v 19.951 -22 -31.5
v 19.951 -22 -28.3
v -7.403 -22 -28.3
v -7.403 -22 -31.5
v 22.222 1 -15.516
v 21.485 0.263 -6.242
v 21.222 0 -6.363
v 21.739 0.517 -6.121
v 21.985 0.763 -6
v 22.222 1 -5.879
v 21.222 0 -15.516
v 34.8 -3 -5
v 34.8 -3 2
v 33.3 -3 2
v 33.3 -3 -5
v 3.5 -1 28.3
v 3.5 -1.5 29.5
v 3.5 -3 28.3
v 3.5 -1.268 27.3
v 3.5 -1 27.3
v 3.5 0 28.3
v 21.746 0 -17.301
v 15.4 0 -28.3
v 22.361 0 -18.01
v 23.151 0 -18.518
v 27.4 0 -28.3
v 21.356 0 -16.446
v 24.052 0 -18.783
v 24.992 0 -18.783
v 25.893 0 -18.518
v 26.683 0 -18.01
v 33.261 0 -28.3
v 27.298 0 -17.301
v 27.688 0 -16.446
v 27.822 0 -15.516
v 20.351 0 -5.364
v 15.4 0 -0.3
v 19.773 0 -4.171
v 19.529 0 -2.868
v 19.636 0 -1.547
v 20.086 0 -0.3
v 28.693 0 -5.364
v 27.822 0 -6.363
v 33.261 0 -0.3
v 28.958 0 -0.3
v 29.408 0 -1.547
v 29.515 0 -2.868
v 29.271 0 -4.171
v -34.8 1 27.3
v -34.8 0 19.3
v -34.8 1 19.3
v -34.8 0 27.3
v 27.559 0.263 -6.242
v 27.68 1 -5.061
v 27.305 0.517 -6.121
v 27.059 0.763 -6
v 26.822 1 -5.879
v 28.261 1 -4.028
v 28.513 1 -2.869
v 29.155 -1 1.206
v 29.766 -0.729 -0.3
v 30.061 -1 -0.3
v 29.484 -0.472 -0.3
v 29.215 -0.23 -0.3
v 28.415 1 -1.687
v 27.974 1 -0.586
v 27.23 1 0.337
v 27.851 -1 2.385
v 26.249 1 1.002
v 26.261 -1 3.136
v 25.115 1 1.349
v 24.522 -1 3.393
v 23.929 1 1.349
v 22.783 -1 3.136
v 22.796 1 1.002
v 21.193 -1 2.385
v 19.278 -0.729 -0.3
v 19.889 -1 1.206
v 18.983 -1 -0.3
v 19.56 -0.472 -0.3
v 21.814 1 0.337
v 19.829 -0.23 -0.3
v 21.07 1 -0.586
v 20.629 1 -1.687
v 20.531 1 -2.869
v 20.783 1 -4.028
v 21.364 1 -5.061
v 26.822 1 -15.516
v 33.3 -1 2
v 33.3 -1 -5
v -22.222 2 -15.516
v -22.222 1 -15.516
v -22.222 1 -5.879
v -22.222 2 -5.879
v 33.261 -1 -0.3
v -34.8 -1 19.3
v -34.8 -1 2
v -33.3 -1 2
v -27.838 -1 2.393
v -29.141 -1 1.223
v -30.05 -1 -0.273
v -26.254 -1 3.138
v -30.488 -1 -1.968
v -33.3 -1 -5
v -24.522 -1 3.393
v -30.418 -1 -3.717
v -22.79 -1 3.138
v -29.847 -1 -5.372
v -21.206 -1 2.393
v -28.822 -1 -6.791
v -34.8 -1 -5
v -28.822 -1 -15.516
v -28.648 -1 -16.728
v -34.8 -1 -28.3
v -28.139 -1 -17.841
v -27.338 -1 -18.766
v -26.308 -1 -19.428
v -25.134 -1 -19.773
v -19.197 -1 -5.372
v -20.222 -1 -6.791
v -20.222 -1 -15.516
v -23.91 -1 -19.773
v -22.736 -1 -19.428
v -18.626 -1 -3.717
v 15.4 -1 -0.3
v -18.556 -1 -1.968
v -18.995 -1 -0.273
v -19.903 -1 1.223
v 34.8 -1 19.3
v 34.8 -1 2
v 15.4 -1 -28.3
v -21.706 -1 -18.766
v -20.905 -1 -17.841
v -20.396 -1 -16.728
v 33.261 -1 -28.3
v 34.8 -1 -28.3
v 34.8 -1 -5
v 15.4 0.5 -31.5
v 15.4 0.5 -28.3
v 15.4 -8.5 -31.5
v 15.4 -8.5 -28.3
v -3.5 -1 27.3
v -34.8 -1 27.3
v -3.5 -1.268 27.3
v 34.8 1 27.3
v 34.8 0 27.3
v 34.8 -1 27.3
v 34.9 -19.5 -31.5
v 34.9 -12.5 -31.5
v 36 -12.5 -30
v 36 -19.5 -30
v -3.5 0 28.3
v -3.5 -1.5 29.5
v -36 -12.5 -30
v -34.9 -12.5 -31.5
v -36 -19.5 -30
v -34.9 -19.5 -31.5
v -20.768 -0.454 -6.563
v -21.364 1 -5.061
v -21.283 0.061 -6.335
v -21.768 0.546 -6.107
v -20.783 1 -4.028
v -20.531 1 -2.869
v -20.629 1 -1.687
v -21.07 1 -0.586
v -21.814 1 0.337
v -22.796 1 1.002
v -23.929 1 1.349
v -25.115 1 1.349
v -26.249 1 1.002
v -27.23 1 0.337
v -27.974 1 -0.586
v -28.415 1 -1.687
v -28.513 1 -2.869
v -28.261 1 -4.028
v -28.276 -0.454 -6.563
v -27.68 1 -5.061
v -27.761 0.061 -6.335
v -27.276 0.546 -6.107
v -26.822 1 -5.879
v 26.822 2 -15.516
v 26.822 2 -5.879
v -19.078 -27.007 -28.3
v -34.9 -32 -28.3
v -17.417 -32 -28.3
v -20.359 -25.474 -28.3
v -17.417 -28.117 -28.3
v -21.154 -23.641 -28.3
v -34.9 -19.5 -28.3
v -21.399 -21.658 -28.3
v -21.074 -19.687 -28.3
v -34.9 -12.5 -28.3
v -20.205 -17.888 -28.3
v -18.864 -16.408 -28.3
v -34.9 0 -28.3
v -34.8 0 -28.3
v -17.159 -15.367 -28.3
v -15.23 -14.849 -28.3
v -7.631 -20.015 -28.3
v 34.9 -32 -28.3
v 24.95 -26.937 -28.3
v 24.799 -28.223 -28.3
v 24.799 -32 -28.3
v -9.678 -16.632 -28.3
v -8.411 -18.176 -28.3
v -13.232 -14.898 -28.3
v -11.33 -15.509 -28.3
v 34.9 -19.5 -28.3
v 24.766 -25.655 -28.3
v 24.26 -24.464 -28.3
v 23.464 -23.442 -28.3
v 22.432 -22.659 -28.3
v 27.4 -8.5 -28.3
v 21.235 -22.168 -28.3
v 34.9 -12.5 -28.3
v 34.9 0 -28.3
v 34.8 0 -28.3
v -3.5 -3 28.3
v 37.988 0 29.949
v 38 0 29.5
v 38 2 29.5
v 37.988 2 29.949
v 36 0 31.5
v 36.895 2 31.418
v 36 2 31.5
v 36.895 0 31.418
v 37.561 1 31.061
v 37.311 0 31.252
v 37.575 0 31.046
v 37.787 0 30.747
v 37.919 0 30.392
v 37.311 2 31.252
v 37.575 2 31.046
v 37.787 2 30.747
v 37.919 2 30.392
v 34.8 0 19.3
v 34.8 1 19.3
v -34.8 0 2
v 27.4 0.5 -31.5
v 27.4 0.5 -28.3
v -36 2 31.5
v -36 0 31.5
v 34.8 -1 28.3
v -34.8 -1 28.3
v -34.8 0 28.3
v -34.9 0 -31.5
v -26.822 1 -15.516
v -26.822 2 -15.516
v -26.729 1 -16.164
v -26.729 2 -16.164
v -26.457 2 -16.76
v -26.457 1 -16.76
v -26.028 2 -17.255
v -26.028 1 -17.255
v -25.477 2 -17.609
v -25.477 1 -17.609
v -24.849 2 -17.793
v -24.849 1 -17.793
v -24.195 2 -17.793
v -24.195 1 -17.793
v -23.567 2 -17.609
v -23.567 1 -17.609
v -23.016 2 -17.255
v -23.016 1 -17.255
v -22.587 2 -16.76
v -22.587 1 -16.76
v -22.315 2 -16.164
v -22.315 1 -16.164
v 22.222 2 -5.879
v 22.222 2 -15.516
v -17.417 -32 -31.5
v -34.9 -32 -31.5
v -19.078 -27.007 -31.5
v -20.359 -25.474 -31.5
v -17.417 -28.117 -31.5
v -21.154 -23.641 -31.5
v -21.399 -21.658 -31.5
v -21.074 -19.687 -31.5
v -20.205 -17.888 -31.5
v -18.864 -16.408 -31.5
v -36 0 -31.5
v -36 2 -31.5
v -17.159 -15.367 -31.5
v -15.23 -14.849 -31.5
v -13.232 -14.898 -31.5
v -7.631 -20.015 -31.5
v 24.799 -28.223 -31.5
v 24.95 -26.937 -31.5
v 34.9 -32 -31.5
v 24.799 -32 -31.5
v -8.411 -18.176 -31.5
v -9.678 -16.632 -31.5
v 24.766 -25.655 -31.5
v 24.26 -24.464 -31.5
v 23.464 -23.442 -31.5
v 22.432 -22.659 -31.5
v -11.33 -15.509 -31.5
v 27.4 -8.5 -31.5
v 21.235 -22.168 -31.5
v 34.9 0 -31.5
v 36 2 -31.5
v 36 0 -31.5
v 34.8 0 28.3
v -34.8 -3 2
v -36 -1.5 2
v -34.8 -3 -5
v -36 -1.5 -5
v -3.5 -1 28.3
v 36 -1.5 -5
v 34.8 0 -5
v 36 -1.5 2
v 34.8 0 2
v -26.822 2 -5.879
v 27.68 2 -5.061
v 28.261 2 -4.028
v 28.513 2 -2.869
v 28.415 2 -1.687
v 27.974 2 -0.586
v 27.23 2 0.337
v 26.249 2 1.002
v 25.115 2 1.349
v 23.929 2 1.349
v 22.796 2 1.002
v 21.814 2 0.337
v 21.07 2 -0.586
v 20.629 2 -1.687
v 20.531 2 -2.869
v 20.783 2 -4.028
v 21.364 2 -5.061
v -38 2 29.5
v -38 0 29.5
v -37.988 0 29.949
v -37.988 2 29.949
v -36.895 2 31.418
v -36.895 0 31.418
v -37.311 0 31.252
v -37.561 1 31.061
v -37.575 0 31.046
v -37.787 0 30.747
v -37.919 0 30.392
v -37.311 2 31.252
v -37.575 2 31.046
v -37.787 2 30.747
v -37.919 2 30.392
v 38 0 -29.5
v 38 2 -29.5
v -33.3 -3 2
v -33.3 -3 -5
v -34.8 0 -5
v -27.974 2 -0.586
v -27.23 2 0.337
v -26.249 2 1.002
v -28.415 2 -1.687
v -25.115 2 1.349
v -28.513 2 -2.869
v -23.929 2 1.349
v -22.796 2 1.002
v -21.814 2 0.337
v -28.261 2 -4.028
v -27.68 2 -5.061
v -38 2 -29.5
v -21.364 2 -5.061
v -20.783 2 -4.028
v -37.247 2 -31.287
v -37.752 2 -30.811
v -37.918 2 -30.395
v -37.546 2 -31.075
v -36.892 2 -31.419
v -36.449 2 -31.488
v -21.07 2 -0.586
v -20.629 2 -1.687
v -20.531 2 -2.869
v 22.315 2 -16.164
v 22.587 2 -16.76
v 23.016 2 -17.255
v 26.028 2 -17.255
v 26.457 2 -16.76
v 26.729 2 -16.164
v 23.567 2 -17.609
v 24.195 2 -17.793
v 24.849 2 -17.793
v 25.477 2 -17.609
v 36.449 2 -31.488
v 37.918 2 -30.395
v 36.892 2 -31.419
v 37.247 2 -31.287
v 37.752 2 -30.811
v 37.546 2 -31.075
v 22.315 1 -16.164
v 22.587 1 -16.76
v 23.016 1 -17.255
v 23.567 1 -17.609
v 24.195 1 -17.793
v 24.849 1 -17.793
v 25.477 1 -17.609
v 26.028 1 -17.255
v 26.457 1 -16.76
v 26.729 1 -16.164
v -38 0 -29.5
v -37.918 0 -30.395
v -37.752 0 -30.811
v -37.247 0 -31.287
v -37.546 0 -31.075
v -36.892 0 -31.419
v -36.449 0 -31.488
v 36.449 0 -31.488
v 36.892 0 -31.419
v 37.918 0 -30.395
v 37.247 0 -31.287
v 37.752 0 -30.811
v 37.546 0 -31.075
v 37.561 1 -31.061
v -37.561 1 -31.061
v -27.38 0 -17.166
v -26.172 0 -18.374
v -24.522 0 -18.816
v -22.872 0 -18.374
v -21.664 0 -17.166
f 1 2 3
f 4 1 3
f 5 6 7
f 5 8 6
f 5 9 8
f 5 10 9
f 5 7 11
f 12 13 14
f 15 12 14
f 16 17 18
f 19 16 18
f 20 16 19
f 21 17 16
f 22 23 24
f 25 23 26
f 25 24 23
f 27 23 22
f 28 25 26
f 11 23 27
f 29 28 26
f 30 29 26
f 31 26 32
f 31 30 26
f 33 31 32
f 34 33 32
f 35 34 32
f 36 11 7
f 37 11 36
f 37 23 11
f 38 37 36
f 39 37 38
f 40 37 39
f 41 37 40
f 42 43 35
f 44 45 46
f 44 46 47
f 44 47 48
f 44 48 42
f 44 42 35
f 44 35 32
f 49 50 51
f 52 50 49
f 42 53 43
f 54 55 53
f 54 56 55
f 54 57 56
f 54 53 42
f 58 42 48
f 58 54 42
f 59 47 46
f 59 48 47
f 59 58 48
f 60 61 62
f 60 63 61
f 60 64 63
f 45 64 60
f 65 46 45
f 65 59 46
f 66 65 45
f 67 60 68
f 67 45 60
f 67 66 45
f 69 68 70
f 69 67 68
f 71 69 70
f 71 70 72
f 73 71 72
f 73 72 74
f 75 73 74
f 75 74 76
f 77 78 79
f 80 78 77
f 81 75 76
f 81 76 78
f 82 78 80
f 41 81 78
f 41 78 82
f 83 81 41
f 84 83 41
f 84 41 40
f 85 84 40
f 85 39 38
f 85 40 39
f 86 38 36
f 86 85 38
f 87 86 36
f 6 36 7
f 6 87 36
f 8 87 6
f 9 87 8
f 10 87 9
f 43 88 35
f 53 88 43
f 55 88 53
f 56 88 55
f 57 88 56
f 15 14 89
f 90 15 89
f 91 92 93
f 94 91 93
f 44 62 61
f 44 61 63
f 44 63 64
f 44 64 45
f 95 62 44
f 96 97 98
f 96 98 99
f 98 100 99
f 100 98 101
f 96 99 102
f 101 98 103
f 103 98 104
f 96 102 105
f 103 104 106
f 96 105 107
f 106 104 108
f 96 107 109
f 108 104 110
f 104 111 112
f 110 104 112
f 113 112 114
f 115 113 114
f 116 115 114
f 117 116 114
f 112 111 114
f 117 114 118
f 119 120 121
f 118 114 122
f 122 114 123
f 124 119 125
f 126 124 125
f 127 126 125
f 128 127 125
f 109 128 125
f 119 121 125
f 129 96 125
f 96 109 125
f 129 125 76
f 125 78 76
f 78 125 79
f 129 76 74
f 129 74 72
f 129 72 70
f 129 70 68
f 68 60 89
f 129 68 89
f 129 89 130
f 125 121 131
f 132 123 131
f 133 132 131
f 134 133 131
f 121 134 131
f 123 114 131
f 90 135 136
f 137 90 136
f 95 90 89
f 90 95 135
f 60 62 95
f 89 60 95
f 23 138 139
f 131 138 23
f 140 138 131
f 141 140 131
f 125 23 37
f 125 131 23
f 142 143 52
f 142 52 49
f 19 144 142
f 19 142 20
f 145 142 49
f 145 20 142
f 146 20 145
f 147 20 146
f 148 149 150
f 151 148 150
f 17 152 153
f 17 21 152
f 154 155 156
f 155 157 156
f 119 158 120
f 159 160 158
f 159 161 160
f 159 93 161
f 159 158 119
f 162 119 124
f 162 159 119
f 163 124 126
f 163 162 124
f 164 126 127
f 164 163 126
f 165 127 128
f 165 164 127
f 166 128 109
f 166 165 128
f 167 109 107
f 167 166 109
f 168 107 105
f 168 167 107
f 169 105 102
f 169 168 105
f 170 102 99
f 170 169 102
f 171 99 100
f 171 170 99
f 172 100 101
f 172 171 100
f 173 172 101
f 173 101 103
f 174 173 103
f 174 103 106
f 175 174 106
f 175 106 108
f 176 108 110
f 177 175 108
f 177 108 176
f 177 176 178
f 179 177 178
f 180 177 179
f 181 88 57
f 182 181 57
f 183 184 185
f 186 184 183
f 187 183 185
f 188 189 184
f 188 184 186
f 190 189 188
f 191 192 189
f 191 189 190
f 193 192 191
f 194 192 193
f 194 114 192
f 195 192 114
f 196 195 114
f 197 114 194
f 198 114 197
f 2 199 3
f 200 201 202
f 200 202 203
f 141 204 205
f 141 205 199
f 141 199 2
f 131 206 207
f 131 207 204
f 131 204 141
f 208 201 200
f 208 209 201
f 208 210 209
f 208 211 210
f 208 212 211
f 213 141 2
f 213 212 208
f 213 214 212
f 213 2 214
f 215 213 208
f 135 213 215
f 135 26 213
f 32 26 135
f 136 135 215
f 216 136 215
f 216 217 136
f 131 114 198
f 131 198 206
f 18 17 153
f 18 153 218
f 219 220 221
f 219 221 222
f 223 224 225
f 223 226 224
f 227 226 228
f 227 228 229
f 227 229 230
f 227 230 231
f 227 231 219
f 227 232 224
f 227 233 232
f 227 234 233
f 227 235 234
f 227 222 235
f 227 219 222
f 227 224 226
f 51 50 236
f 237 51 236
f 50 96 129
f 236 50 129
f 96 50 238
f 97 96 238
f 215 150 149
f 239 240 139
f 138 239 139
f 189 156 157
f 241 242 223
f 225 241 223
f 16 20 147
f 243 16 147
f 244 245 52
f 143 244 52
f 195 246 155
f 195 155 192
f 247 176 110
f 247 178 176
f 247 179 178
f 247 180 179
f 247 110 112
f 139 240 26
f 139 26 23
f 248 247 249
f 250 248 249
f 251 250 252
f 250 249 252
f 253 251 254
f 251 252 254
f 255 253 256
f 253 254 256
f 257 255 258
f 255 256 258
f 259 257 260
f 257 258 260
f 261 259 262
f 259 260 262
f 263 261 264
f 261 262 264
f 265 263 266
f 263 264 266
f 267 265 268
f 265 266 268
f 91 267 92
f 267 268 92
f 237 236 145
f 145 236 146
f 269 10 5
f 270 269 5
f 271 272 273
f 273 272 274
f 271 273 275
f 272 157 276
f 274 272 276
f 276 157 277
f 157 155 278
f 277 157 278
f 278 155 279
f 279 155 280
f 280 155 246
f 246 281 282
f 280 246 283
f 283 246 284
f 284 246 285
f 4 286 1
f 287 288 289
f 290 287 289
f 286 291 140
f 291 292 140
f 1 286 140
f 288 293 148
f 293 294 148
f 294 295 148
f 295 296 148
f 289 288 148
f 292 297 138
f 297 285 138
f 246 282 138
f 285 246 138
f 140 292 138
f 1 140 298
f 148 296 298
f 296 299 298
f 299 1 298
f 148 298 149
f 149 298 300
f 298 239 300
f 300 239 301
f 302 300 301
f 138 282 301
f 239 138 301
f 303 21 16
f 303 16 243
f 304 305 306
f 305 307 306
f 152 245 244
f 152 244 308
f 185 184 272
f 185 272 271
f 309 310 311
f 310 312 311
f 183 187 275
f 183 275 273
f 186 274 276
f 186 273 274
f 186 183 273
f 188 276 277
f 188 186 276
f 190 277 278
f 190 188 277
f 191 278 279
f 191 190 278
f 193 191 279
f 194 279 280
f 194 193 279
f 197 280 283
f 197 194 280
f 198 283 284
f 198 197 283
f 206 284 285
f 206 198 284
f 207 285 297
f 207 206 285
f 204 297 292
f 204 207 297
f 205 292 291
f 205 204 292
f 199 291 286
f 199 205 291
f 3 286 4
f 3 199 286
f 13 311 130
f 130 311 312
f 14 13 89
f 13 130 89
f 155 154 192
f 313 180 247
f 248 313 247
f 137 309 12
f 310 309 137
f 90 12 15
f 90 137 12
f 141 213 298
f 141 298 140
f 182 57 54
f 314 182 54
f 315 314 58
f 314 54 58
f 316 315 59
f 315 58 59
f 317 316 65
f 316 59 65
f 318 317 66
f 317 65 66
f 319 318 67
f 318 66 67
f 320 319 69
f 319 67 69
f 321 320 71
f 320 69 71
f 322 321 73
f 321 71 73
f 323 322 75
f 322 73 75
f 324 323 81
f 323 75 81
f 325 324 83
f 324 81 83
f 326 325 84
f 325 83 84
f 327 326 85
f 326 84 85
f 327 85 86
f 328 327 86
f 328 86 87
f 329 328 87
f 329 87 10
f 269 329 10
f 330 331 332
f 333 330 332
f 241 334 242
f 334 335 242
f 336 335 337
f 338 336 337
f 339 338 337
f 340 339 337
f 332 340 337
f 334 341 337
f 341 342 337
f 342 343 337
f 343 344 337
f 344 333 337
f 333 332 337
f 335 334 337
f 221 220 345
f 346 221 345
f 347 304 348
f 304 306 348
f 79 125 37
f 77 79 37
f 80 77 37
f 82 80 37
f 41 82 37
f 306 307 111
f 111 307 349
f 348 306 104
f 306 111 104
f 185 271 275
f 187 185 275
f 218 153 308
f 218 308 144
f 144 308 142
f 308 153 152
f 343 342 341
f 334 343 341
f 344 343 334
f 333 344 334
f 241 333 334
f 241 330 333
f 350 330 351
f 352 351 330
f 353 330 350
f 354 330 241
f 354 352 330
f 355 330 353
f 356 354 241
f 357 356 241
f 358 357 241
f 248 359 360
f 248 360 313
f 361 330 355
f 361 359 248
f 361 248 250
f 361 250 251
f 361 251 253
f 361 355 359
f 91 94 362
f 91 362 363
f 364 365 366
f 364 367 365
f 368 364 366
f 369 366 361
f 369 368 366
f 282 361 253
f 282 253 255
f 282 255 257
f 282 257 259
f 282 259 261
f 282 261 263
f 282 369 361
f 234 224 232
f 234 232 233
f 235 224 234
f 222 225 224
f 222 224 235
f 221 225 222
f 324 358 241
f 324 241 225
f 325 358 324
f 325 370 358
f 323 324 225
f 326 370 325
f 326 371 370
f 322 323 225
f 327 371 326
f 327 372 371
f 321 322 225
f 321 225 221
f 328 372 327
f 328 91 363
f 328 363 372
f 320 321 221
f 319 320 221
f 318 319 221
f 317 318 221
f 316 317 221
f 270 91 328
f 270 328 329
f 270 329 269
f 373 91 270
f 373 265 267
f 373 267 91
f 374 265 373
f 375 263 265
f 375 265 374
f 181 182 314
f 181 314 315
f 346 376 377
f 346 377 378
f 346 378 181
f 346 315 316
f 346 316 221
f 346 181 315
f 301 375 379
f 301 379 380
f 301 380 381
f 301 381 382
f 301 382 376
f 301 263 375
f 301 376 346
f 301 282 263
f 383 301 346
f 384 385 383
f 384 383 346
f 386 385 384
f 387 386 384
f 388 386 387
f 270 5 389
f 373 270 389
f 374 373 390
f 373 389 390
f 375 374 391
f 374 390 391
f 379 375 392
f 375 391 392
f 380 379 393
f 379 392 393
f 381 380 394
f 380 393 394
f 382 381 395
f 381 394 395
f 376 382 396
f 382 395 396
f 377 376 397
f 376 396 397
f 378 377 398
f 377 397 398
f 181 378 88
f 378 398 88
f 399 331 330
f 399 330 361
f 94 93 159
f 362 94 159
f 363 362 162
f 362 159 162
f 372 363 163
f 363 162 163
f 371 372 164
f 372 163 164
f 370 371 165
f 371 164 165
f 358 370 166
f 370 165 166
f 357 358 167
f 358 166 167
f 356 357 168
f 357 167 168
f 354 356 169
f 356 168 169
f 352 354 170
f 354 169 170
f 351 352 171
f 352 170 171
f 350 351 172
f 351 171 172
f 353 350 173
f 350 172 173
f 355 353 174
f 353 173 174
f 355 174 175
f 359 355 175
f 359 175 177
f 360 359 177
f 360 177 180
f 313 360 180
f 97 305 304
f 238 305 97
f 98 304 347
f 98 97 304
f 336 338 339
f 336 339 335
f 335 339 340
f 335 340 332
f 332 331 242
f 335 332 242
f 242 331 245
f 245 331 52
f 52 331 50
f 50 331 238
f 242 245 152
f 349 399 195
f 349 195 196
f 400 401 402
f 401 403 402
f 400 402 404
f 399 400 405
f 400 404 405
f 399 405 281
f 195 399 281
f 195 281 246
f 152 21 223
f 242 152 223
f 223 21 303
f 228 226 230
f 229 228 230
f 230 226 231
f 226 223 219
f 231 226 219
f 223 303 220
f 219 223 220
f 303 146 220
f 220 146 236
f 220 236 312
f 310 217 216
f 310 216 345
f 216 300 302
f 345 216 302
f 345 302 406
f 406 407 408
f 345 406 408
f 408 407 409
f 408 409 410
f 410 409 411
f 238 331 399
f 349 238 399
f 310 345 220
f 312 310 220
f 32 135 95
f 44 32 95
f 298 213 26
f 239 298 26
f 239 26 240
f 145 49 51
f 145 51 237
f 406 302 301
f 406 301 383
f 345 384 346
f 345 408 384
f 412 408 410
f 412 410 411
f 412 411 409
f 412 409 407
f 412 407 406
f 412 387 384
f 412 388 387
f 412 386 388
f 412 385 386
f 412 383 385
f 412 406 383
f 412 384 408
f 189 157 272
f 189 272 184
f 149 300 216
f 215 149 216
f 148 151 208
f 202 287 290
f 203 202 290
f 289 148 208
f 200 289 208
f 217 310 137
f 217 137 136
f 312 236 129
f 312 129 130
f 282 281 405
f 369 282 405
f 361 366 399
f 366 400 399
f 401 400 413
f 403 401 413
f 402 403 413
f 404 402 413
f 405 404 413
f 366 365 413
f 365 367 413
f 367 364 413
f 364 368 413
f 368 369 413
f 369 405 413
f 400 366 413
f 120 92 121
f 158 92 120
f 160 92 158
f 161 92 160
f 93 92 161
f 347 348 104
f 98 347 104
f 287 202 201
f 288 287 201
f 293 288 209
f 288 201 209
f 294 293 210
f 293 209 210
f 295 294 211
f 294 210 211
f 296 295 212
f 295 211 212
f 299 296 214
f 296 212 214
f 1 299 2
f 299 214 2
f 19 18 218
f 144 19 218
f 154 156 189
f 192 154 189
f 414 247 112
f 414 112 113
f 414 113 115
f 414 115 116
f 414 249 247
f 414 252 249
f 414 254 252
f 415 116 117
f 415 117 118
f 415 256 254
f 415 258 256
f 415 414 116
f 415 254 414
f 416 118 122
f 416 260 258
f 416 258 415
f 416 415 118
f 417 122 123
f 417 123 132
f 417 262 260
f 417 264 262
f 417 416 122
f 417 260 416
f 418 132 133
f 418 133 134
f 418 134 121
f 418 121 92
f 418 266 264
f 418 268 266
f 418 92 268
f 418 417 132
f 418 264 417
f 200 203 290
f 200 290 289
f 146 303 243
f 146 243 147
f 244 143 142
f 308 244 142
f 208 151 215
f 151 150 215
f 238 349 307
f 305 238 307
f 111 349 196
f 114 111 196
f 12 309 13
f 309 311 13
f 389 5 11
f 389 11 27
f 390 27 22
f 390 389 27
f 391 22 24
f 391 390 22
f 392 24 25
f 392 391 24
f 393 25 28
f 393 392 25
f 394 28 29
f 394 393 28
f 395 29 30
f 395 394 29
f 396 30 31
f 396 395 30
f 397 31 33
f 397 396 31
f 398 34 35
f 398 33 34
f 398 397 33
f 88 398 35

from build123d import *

# Parameters (mm, degrees)
SKETCH1_W               = 76
SKETCH1_H               = 63
BOSS_EXTRUDE1_DEPTH     = 2
SKETCH2_W               = 69.6
SKETCH2_H               = 56.6
BOSS_EXTRUDE2_DEPTH     = 1
SKETCH3_W               = 69.8
SKETCH3_H               = 3.2
BOSS_EXTRUDE3_DEPTH     = 32
BOSS_EXTRUDE4_DEPTH     = 3.5
BOSS_EXTRUDE5_DEPTH     = 3.5
BOSS_EXTRUDE6_DEPTH     = 3.5
CUT_EXTRUDE1_DEPTH      = 7
CHAMFER1_SIZE           = 2
FILLET1_SIZE            = 2
CUT_EXTRUDE2_DEPTH      = 81.23091686
CUT_EXTRUDE2_DEPTH_BACK = 3.2
SKETCH8_R               = 7
SKETCH8_W               = 12
SKETCH8_H               = 9
SKETCH9_W               = 17.861030929
SKETCH9_H               = 28
CUT_EXTRUDE3_DEPTH      = 1
SKETCH10_W              = 69.6
SKETCH10_H              = 8
CUT_EXTRUDE4_DEPTH      = 2
CHAMFER2_SIZE2          = 1
CHAMFER2_SIZE           = 1.732050808
CUT_EXTRUDE5_DEPTH      = 3.2


# Some blends are built 0.0001 mm under size
with BuildPart() as part:
    # Sketch1 → Boss-Extrude1 (new body)
    with BuildSketch(Plane(origin=(0, 0, 0), x_dir=(1, 0, 0), z_dir=(0, 1, 0))):
        Rectangle(SKETCH1_W, SKETCH1_H)
    extrude(amount=BOSS_EXTRUDE1_DEPTH)

    # Sketch2 → Boss-Extrude2 (add)
    with BuildSketch(Plane(origin=(0, 0, 0), x_dir=(1, 0, 0), z_dir=(0, 1, 0))):
        Rectangle(SKETCH2_W, SKETCH2_H)
    extrude(amount=-BOSS_EXTRUDE2_DEPTH)

    # Sketch3 → Boss-Extrude3 (add)
    with BuildSketch(Plane.XZ):
        with Locations((0, -29.9)):
            Rectangle(SKETCH3_W, SKETCH3_H)
    extrude(amount=BOSS_EXTRUDE3_DEPTH)

    # Sketch4 → Boss-Extrude4 (add, symmetric)
    with BuildSketch(Plane.XY.offset(-1.5)):
        Polygon((-34.8, 0), (-36, -1.5), (-34.8, -3), (-33.3, -3), (-33.3, 0), align=None)
        Polygon((33.3, 0), (34.8, 0), (36, -1.5), (34.8, -3), (33.3, -3), align=None)
    extrude(amount=BOSS_EXTRUDE4_DEPTH, both=True)

    # Sketch5 → Boss-Extrude5 (add, symmetric)
    with BuildSketch(Plane(origin=(0, 0, 0), x_dir=(0, 0, -1), z_dir=(1, 0, 0))):
        Polygon((-28.3, 0), (-29.5, -1.5), (-28.3, -3), (-27.3, -3), (-27.3, 0), align=None)
    extrude(amount=BOSS_EXTRUDE5_DEPTH, both=True)

    # Sketch6 → Boss-Extrude6 (add, symmetric)
    with BuildSketch(Plane(origin=(0, -16, 0), x_dir=(-1, 0, 0), z_dir=(0, -1, 0))):
        Polygon((-34.9, 31.5), (-36, 30), (-34.9, 28.3), align=None)
        Polygon((34.9, 28.3), (34.9, 31.5), (36, 30), align=None)
    extrude(amount=BOSS_EXTRUDE6_DEPTH, both=True)

    # Sketch7 → Cut-Extrude1 (cut)
    with BuildSketch(Plane.XZ.offset(1)):
        with BuildLine():
            Line((-26.822034097, -5.879323383), (-26.822034097, -15.516493675))
            ThreePointArc((-26.822034097, -15.516493675), (-24.522034097, -17.816493675), (-22.222034097, -15.516493675))
            Line((-22.222034097, -15.516493675), (-22.222034097, -5.879323383))
            ThreePointArc((-22.222034097, -5.879323383), (-24.522034097, 1.393290251), (-26.822034097, -5.879323383))
        make_face()
        with BuildLine():
            Line((22.222034097, -5.879323383), (22.222034097, -15.516493675))
            ThreePointArc((22.222034097, -15.516493675), (24.522034097, -17.816493675), (26.822034097, -15.516493675))
            Line((26.822034097, -15.516493675), (26.822034097, -5.879323383))
            ThreePointArc((26.822034097, -5.879323383), (24.522034097, 1.393290251), (22.222034097, -5.879323383))
        make_face()
    extrude(amount=-CUT_EXTRUDE1_DEPTH, mode=Mode.SUBTRACT)

    # Chamfer1
    chamfer1_edges = [part.edges().sort_by_distance(p)[0] for p in [
        (-24.522034097, -1, 1.393290251),
        (-26.822034097, -1, -10.697908529),
        (-24.522034097, -1, -17.816493675),
        (-22.222034097, -1, -10.697908529),
        (24.522034097, -1, -17.816493675),
        (26.822034097, -1, -10.697908529),
        (24.522034097, -1, 1.393290251),
        (22.222034097, -1, -10.697908529),
    ]]
    chamfer(chamfer1_edges, length=CHAMFER1_SIZE)

    # Fillet1
    # a fillet whose section is not a circle: 2 mm, written as the material it takes off along each edge
    with BuildSketch(Plane(origin=(38, -5, 31.5), x_dir=(0, 0, -1), z_dir=(0, 1, 0)), Plane(origin=(38, -5, -31.5), x_dir=(-1, 0, 0), z_dir=(0, 1, 0))) as fillet1_piece_1:
        with BuildLine():
            add(Edge.make_bspline([(FILLET1_SIZE, 0), (FILLET1_SIZE * 0.831801948466, 0), (FILLET1_SIZE * 0.663603896932, 0), (FILLET1_SIZE * 0.292893218813, FILLET1_SIZE * 0.0716919198361), (FILLET1_SIZE * 0.0716919198361, FILLET1_SIZE * 0.292893218813), (0, FILLET1_SIZE * 0.663603896932), (0, FILLET1_SIZE * 0.831801948466), (0, FILLET1_SIZE)], knots=[0, 0, 0, 0, 0, 0, 0.5, 0.5, 1, 1, 1, 1, 1, 1], degree=5))
            Line((0, FILLET1_SIZE), (0, 0))
            Line((0, 0), (FILLET1_SIZE, 0))
        make_face()
    extrude(amount=12, mode=Mode.SUBTRACT)
    with BuildSketch(Plane(origin=(-38, -5, 31.5), x_dir=(0, 0, -1), z_dir=(0, 1, 0)), Plane(origin=(-38, -5, -31.5), x_dir=(1, 0, 0), z_dir=(0, 1, 0))) as fillet1_piece_2:
        with BuildLine():
            add(Edge.make_bspline([(FILLET1_SIZE, 0), (FILLET1_SIZE * 0.831801948466, 0), (FILLET1_SIZE * 0.663603896932, 0), (FILLET1_SIZE * 0.292893218813, -FILLET1_SIZE * 0.0716919198361), (FILLET1_SIZE * 0.0716919198361, -FILLET1_SIZE * 0.292893218813), (0, -FILLET1_SIZE * 0.663603896932), (0, -FILLET1_SIZE * 0.831801948466), (0, -FILLET1_SIZE)], knots=[0, 0, 0, 0, 0, 0, 0.5, 0.5, 1, 1, 1, 1, 1, 1], degree=5))
            Line((0, -FILLET1_SIZE), (0, 0))
            Line((0, 0), (FILLET1_SIZE, 0))
        make_face()
    extrude(amount=12, mode=Mode.SUBTRACT)

    # Sketch8 → Cut-Extrude2 (cut, two sides: drawn at the far end of the back side and taken through both)
    with BuildSketch(Plane(origin=(0, 0, -31.5), x_dir=(-1, 0, 0), z_dir=(0, 0, -1)).offset(-CUT_EXTRUDE2_DEPTH_BACK)):
        with Locations((14.4, -21.8)):
            Circle(SKETCH8_R)
        with BuildLine():
            Line((-19.95069293, -22), (-11.95069293, -22))
            ThreePointArc((-11.95069293, -22), (-6.95069293, -27), (-11.95069293, -32))
            Line((-11.95069293, -32), (-19.95069293, -32))
            ThreePointArc((-19.95069293, -32), (-24.95069293, -27), (-19.95069293, -22))
        make_face()
        with Locations((-21.4, -4)):
            Rectangle(SKETCH8_W, SKETCH8_H)
    extrude(amount=CUT_EXTRUDE2_DEPTH + CUT_EXTRUDE2_DEPTH_BACK, mode=Mode.SUBTRACT)

    # Sketch9 → Cut-Extrude3 (cut)
    with BuildSketch(Plane.XZ.offset(1)):
        with Locations((24.330515464, -14.3)):
            Rectangle(SKETCH9_W, SKETCH9_H)
    extrude(amount=-CUT_EXTRUDE3_DEPTH, mode=Mode.SUBTRACT)

    # Sketch10 → Cut-Extrude4 (cut)
    with BuildSketch(Plane.XZ.offset(1)):
        with Locations((0, 23.3)):
            Rectangle(SKETCH10_W, SKETCH10_H)
    extrude(amount=-CUT_EXTRUDE4_DEPTH, mode=Mode.SUBTRACT)

    # Chamfer2
    chamfer2_edges = [part.edges().sort_by_distance(p)[0] for p in [
        (0, -3, 27.3),
    ]]
    chamfer2_side = [part.faces().sort_by_distance(p)[0] for p in [
        (0, -2.98, 27.3),
    ]]
    chamfer(chamfer2_edges, length=CHAMFER2_SIZE - 0.0001, length2=CHAMFER2_SIZE2 - 0.0001, reference=chamfer2_side[0])  # a hair under: the kernel refuses the full size

    # Sketch11 → Cut-Extrude5 (cut)
    with BuildSketch(Plane(origin=(0, 0, -31.5), x_dir=(-1, 0, 0), z_dir=(0, 0, -1))):
        Polygon((-24.798914111, -28.222600255), (-24.798914111, -36.274254695), (17.416877144, -36.274254695), (17.416877144, -28.116522168), (7.402857726, -22), (-13.082910041, -22), (-13.082910041, -28.222600255), align=None)
    extrude(amount=-CUT_EXTRUDE5_DEPTH, mode=Mode.SUBTRACT)


solid = part.part
